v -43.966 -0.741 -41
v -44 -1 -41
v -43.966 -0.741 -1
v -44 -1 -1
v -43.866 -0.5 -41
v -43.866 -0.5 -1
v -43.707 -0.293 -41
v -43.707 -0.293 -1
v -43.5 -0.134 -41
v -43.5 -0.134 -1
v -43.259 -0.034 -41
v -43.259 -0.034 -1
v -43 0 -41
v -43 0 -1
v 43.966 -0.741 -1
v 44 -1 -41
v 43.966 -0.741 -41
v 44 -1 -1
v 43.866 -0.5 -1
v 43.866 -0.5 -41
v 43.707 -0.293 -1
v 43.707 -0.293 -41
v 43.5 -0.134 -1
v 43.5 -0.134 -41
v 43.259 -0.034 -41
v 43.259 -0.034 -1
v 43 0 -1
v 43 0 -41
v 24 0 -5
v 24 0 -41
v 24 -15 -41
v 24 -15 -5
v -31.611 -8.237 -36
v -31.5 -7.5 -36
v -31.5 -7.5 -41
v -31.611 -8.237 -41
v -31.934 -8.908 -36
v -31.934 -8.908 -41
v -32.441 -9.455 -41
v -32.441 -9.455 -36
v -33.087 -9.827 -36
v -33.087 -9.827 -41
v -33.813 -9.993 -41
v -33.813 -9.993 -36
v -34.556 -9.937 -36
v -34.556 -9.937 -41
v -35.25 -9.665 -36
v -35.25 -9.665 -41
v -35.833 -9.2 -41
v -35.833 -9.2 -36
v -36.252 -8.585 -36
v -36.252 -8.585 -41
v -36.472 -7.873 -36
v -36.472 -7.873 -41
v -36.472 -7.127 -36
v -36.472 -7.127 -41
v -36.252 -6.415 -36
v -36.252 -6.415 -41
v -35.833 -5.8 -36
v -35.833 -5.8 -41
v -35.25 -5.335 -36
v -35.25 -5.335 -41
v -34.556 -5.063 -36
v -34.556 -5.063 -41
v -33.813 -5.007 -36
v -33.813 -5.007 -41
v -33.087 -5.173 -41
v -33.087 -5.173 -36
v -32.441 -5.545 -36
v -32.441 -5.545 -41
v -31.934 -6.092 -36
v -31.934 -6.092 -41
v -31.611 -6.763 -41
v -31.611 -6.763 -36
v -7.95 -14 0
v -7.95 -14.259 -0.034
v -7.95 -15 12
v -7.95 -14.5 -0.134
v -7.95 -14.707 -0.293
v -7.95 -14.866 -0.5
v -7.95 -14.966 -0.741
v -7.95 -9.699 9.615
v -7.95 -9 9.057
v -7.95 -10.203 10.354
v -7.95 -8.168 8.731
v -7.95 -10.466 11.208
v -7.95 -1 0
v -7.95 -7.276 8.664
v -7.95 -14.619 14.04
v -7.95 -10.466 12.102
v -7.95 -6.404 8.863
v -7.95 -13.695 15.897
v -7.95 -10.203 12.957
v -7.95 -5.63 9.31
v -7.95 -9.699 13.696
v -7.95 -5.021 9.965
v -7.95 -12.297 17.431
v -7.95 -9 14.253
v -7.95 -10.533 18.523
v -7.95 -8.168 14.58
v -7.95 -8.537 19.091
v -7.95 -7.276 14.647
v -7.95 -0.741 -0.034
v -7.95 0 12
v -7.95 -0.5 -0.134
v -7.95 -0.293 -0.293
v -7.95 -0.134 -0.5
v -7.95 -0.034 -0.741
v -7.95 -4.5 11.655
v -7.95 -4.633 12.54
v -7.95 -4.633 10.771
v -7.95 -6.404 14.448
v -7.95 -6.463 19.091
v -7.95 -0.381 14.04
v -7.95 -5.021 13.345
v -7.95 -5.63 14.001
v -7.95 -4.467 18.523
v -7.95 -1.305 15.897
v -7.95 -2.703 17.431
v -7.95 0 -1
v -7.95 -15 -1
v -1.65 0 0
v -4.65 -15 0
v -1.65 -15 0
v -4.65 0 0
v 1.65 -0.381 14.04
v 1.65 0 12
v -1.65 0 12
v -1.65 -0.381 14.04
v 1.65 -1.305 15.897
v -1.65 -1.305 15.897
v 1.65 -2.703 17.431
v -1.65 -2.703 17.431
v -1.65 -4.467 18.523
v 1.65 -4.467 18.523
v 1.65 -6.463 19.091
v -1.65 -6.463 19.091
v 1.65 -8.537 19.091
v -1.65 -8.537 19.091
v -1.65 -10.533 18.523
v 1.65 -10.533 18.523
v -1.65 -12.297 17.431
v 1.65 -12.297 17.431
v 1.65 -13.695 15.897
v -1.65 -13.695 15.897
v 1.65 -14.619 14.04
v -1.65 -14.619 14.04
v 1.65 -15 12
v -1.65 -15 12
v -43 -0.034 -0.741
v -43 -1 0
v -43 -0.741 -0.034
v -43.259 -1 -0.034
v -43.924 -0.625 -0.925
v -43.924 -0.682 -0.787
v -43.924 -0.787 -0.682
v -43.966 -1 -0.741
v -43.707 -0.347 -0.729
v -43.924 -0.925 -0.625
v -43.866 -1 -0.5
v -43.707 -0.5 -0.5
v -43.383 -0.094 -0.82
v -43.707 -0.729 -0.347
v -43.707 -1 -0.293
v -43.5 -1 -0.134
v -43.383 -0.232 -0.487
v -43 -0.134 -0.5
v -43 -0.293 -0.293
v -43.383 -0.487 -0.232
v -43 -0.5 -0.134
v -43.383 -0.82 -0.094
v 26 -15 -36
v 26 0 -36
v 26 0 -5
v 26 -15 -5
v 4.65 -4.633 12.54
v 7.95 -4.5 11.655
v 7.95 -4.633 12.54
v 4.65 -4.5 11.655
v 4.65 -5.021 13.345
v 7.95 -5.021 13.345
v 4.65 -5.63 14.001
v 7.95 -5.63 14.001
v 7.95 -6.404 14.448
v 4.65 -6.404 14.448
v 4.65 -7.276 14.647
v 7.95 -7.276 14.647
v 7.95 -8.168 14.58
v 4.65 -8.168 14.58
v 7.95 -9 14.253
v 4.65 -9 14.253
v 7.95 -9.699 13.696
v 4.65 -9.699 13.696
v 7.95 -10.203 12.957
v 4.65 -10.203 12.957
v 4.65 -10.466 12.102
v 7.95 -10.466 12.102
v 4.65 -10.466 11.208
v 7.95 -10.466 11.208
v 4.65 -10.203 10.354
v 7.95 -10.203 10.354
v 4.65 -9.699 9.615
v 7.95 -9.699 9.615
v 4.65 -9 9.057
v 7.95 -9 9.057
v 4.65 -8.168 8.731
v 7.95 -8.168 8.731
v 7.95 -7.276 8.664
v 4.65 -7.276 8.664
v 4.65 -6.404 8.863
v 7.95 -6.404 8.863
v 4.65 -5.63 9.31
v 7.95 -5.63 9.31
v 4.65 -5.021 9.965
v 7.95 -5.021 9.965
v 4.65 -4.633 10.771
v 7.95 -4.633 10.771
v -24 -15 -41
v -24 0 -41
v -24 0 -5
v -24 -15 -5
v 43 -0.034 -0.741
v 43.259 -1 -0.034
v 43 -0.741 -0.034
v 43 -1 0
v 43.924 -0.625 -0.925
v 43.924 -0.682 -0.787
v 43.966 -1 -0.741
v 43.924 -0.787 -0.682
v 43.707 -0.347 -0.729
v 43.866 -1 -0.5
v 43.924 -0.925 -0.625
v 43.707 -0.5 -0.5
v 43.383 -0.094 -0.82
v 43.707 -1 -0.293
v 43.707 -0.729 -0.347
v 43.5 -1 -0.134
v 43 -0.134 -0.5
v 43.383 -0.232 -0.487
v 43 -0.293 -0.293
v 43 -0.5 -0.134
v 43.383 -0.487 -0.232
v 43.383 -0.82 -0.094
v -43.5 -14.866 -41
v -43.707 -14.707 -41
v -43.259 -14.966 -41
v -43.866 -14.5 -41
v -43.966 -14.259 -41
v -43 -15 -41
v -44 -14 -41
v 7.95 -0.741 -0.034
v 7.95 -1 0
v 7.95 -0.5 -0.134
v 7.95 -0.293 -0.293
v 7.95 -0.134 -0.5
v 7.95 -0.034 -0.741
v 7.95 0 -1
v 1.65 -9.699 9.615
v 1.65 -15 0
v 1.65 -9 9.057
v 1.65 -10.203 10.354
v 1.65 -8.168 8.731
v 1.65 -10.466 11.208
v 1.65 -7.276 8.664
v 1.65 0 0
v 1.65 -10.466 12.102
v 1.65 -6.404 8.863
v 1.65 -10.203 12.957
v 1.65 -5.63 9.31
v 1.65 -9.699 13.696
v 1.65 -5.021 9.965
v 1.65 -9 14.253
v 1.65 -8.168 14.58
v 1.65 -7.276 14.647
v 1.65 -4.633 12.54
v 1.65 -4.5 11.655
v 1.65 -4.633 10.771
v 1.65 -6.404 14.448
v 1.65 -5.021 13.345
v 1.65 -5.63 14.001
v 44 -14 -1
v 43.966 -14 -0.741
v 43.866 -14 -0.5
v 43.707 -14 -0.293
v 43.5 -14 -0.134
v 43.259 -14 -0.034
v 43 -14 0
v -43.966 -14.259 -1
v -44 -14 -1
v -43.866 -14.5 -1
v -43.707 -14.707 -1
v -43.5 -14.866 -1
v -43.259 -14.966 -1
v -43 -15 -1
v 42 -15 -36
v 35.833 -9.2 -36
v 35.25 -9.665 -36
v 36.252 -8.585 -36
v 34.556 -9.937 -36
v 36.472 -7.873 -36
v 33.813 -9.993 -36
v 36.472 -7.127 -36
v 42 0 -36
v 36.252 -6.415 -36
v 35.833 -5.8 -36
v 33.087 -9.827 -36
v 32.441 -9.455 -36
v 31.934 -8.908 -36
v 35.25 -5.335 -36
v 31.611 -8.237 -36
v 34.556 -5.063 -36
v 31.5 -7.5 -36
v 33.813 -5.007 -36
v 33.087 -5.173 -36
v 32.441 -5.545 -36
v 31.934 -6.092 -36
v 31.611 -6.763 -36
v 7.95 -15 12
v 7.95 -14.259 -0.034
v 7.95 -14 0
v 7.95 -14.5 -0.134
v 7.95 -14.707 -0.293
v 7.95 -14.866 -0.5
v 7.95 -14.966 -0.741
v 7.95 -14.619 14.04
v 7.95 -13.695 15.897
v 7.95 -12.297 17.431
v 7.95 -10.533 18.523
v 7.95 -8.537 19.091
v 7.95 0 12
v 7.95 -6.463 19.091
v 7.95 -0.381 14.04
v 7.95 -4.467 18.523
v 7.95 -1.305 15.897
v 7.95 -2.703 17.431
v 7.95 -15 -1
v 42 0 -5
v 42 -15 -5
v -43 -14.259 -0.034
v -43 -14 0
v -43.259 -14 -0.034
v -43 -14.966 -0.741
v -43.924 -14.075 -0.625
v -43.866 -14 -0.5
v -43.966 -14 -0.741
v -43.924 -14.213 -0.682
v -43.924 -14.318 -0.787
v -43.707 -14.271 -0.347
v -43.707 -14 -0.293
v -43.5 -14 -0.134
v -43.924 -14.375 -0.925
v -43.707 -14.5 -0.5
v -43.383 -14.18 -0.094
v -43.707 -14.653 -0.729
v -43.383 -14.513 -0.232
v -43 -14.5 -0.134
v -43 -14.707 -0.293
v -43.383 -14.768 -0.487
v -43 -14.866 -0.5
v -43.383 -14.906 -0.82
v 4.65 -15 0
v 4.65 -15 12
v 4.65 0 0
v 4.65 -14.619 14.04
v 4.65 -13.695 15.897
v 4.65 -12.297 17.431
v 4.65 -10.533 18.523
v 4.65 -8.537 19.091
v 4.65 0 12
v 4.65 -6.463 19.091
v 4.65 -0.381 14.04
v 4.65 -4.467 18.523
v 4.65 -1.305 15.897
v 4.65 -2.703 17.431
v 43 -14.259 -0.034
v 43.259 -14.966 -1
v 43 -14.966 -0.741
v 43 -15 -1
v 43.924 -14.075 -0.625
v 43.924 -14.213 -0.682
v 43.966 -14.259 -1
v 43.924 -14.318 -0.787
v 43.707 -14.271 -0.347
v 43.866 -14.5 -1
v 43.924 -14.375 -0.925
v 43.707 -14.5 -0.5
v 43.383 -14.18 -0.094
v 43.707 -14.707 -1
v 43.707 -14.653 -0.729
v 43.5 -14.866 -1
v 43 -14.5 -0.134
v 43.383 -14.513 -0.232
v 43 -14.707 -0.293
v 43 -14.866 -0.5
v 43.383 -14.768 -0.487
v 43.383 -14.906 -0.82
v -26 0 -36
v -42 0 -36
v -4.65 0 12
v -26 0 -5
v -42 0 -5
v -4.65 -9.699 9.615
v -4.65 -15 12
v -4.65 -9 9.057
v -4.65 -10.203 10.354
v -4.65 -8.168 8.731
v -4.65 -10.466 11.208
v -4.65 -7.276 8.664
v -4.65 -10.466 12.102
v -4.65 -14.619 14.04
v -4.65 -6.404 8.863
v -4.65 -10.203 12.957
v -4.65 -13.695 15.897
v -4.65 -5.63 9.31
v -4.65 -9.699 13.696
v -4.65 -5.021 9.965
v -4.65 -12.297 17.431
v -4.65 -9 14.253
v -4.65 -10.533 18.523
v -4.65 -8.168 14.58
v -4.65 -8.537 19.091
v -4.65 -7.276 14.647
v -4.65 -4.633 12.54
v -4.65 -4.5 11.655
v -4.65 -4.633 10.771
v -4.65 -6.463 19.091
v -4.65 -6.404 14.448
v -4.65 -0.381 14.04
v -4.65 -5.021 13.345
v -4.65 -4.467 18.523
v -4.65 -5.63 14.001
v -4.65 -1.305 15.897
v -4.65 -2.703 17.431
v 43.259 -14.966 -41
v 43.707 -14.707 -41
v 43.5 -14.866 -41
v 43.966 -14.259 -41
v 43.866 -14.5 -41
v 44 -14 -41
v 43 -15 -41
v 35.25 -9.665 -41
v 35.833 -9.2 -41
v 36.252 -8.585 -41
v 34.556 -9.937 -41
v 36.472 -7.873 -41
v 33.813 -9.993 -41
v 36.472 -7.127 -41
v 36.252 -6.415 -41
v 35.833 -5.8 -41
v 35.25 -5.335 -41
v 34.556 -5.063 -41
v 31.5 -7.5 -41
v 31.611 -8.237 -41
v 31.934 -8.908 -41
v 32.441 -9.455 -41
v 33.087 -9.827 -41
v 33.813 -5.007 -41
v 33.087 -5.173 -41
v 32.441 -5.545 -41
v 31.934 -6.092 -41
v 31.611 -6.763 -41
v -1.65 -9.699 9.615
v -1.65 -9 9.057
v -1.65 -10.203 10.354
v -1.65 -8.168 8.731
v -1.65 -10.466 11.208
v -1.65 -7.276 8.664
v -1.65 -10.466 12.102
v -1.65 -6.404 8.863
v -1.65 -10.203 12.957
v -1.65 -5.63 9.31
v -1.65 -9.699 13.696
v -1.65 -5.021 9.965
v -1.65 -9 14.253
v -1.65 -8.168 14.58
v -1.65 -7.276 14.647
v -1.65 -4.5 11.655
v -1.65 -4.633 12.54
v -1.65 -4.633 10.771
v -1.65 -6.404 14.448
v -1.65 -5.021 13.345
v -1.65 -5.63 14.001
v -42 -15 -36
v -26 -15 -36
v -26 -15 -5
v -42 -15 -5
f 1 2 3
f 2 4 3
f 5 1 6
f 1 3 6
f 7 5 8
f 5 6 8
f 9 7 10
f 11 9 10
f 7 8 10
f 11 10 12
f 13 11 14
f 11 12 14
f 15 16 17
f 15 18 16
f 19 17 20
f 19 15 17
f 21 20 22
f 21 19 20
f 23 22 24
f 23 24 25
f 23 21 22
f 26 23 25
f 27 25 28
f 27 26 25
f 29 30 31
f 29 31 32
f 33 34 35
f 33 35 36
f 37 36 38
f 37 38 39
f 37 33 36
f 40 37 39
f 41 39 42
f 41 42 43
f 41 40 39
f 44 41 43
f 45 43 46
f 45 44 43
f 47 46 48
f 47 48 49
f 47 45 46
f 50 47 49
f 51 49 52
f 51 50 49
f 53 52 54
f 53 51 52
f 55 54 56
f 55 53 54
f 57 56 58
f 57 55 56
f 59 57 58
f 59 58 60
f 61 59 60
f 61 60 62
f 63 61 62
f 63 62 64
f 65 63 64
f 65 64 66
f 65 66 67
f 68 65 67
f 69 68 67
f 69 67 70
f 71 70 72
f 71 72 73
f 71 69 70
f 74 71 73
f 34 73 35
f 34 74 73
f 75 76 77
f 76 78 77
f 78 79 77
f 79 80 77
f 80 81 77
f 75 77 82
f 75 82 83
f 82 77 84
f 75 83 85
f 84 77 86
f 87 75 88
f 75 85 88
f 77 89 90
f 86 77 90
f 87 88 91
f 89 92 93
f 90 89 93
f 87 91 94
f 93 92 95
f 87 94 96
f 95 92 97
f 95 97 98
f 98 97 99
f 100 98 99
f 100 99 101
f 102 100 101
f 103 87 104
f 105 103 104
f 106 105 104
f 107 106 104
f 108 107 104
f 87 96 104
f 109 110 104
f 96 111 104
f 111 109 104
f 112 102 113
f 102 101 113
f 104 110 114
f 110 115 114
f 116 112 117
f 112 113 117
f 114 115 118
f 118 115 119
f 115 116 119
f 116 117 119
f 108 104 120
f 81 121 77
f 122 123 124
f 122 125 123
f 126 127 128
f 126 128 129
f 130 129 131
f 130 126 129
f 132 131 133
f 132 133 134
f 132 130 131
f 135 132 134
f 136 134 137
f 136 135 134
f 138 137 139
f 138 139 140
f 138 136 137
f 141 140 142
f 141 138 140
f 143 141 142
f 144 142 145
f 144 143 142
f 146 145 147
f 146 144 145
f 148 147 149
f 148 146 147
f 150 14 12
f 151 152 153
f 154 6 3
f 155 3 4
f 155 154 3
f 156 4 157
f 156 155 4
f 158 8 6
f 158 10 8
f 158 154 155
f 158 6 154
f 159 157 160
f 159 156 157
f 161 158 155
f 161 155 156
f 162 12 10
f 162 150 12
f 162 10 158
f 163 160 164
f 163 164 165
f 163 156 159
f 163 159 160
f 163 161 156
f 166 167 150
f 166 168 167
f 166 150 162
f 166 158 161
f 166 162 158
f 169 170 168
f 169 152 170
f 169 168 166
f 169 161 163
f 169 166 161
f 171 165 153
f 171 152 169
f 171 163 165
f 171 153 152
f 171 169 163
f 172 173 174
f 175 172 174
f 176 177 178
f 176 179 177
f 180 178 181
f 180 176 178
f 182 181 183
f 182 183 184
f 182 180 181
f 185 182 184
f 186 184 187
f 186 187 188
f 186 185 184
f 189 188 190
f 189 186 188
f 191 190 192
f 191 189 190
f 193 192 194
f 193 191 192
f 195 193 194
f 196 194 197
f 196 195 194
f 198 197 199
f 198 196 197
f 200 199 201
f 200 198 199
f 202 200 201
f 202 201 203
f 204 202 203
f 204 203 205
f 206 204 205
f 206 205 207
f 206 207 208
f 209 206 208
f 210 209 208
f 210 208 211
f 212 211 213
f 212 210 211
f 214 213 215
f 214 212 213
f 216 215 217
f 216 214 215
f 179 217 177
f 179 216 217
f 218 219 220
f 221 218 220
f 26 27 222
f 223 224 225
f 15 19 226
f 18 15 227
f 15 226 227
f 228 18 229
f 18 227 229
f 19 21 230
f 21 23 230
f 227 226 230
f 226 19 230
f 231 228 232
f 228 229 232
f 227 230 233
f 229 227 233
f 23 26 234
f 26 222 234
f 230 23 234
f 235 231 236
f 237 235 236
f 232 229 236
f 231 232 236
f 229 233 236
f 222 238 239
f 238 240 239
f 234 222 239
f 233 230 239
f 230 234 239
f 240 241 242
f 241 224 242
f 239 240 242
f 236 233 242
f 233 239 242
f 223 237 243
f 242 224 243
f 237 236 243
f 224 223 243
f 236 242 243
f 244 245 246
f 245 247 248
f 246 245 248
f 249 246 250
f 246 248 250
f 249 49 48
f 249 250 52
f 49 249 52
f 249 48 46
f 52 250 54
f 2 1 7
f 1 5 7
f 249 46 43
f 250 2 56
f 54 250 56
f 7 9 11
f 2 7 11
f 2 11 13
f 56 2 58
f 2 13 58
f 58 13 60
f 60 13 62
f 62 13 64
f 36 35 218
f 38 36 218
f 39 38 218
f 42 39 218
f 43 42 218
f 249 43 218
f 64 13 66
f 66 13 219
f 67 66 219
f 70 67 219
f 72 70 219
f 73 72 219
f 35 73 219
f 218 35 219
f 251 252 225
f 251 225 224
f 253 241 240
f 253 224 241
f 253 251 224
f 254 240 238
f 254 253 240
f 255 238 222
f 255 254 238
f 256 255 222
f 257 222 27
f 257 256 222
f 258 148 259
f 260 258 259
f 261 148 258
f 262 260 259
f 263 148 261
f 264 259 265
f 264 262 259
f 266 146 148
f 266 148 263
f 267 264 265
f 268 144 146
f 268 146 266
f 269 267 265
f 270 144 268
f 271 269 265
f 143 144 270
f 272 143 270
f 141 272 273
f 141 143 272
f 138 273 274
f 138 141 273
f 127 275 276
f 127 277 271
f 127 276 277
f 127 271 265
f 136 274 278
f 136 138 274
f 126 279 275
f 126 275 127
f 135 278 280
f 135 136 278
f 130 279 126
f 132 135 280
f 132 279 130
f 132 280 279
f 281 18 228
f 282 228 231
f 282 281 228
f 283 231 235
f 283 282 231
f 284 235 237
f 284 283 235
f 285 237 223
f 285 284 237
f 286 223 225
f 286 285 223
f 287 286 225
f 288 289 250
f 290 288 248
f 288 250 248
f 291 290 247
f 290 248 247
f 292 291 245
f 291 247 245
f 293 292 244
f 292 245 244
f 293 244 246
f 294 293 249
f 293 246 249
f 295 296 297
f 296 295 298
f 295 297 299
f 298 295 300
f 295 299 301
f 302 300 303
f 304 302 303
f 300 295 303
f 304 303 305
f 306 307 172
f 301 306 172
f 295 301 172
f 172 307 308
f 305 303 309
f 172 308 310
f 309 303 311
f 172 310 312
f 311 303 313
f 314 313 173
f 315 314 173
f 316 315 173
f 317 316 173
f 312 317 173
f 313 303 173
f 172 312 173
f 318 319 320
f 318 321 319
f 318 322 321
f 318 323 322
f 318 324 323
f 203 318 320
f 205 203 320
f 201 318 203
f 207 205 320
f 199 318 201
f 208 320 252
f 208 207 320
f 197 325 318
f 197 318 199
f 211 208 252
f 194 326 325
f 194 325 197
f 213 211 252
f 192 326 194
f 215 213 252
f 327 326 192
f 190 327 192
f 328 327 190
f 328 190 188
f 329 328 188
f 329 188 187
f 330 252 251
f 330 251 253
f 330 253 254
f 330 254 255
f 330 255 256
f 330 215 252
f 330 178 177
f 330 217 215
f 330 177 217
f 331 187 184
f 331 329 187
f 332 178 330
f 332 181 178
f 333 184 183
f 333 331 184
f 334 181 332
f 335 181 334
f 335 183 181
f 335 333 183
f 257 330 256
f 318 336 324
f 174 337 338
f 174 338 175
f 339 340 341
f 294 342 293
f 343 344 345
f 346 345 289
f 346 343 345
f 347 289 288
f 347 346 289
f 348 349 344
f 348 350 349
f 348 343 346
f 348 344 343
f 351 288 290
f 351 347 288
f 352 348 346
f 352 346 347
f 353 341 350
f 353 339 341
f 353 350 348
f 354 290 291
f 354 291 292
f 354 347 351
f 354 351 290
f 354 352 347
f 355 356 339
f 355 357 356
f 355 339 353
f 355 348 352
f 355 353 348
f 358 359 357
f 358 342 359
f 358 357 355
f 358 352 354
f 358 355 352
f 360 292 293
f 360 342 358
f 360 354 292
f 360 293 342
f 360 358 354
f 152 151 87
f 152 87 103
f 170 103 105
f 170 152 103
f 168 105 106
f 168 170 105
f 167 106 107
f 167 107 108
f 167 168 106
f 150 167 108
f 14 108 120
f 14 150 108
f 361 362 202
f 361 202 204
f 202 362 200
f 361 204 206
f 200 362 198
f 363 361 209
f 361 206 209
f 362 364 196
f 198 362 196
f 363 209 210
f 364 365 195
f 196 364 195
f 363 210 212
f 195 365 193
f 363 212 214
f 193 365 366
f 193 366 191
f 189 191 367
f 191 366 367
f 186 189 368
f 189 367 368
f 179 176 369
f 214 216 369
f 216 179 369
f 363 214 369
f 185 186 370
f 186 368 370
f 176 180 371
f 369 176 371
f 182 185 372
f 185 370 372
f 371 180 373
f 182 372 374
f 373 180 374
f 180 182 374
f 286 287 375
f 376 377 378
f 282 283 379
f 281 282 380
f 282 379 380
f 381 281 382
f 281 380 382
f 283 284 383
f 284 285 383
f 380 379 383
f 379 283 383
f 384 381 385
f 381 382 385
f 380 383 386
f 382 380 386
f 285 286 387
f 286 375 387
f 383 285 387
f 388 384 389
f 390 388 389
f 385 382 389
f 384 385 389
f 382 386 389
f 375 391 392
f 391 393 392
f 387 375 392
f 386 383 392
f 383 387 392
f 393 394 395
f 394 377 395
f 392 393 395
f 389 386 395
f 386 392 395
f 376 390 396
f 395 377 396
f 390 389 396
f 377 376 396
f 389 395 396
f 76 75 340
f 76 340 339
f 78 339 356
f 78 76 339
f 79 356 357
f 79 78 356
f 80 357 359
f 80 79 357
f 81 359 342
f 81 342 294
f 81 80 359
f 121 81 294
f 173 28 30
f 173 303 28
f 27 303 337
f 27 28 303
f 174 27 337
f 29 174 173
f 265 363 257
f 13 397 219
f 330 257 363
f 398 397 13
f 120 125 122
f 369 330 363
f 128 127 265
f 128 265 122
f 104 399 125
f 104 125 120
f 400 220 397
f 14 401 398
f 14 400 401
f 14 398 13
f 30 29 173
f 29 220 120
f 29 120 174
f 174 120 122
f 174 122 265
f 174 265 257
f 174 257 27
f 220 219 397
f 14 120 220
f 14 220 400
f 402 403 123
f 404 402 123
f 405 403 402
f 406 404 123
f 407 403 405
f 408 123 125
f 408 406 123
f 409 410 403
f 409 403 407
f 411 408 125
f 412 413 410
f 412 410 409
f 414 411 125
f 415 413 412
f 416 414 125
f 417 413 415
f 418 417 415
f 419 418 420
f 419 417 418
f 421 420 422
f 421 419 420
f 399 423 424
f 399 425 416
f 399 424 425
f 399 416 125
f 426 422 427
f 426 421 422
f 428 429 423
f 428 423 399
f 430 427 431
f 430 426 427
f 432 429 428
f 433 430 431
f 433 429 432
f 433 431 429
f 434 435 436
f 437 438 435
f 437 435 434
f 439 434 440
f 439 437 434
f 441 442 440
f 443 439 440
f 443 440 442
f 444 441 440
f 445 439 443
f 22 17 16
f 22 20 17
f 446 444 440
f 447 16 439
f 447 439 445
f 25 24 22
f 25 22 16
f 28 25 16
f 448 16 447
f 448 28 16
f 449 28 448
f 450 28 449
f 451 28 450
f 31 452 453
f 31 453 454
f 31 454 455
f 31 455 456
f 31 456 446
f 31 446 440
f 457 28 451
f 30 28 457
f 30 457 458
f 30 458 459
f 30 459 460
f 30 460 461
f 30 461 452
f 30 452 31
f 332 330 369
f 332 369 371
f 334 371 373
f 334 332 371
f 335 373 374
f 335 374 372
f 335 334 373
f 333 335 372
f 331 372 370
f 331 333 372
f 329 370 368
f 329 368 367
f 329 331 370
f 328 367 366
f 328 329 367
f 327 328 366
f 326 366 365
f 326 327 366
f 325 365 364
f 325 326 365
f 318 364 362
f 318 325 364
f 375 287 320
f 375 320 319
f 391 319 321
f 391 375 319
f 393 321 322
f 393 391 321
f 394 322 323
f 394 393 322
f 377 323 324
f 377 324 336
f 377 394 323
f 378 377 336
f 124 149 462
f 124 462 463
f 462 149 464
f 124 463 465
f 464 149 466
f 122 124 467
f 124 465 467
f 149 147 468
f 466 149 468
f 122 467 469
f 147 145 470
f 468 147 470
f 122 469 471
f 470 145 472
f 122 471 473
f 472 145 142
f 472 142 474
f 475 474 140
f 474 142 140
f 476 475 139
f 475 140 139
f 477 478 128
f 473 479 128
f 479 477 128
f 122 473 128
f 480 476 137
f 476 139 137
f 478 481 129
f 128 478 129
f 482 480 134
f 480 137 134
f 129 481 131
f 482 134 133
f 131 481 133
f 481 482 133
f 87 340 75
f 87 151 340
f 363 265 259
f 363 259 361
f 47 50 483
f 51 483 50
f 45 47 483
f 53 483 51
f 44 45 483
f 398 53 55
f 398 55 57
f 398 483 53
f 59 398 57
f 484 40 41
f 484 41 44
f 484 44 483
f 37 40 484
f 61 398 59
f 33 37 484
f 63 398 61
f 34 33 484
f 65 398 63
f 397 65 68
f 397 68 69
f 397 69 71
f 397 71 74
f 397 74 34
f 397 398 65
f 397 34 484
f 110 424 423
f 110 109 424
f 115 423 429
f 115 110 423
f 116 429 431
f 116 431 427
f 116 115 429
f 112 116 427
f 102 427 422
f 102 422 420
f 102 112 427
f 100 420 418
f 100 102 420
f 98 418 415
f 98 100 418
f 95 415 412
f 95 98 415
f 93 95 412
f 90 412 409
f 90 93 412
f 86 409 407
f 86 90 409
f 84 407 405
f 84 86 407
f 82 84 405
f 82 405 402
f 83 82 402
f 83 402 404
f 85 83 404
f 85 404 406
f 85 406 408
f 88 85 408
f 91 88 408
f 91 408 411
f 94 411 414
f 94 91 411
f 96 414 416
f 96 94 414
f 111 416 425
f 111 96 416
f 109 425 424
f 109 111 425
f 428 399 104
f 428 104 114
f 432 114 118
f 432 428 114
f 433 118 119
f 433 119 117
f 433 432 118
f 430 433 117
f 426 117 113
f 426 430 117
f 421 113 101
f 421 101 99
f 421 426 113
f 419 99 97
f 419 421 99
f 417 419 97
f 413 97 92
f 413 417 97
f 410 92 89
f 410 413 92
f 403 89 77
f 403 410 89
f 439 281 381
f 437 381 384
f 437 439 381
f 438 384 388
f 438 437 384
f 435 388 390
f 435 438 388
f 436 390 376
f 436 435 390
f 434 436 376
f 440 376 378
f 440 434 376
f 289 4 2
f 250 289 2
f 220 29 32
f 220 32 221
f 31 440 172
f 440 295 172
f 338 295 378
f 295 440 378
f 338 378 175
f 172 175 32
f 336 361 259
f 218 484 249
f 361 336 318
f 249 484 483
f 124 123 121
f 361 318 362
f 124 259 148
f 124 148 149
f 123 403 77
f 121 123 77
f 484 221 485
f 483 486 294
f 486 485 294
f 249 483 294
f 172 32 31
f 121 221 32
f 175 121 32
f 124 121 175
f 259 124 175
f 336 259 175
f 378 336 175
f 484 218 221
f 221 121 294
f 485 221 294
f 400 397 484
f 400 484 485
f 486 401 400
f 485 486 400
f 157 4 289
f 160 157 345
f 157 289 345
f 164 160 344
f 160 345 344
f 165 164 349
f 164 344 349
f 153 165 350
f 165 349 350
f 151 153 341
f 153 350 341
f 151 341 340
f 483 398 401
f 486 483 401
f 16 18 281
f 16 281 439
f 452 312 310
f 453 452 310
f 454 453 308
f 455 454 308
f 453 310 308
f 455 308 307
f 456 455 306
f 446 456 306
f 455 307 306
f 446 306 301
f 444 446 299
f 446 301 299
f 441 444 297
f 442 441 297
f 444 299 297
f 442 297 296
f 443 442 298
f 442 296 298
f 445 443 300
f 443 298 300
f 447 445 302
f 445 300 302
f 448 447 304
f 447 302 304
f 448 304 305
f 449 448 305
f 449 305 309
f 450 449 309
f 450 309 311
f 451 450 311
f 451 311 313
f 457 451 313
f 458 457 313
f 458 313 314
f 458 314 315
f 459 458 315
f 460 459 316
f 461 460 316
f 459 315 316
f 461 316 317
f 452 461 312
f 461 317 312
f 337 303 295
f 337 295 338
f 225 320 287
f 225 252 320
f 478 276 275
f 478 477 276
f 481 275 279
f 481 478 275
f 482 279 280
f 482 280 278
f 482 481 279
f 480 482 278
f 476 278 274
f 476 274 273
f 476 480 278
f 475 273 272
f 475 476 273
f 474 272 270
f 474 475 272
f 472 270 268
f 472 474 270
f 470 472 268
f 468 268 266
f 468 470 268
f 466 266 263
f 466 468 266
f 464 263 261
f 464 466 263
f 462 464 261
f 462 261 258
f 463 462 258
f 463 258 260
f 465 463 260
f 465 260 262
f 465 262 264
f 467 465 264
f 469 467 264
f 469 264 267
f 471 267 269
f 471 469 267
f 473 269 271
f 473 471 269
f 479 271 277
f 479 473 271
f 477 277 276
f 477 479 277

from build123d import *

# Parameters (mm, degrees)
SKETCH_W               = 16
SKETCH_H               = 31
PAD_DEPTH              = 15
SKETCH001_R            = 2.5
POCKET_DEPTH           = 5
SKETCH002_R            = 3
PAD001_DEPTH           = 1.65
LINEARPATTERN_COUNT    = 2
LINEARPATTERN_PITCH    = 6.3
LINEARPATTERN001_COUNT = 2
LINEARPATTERN001_PITCH = 6.3
FILLET_R               = 1
FILLET001_R            = 1
FILLET002_R            = 1
FILLET003_R            = 1
FILLET004_R            = 1
FILLET005_R            = 1


with BuildPart() as part:
    # Sketch → Pad (new body)
    with BuildSketch(Plane.XZ):
        Polygon((0, 0), (-44, 0), (-44, -41), (-24, -41), (-24, -5), (0, -5), align=None)
        with Locations((-34, -20.5)):
            Rectangle(SKETCH_W, SKETCH_H, mode=Mode.SUBTRACT)
    pad = extrude(amount=PAD_DEPTH)

    # Mirrored: Pad across Sketch V_Axis
    add(pad.mirror(Plane(origin=(0, 0, 0), x_dir=(0, -1, 0), z_dir=(1, 0, 0))))

    # Sketch001 (on Face11 of Mirrored) → Pocket (cut)
    with BuildSketch(Plane(origin=(0, 0, -36), x_dir=(-1, 0, 0), z_dir=(0, 0, 1))):
        with Locations((-34, 7.5)):
            Circle(SKETCH001_R)
    pocket = extrude(amount=-POCKET_DEPTH, mode=Mode.SUBTRACT)

    # Mirrored001: Pocket across Sketch001 V_Axis
    add(pocket.mirror(Plane(origin=(0, 0, -36), x_dir=(0, 0, 1), z_dir=(-1, 0, 0))), mode=Mode.SUBTRACT)

    # Sketch002 → Pad001 (join, symmetric)
    with BuildSketch(Plane.YZ):
        with BuildLine():
            Line((-15, 0), (0, 0))
            Line((0, 0), (0, 12))
            ThreePointArc((0, 12), (-7.5, 19.163278), (-15, 12))
            Line((-15, 12), (-15, 0))
        make_face()
        with Locations((-7.5, 11.655364)):
            Circle(SKETCH002_R, mode=Mode.SUBTRACT)
    pad001 = extrude(amount=PAD001_DEPTH, both=True)

    # LinearPattern: Pad001 ×2
    with Locations(*[(i * LINEARPATTERN_PITCH, 0, 0) for i in range(1, LINEARPATTERN_COUNT)]):
        add(pad001)

    # LinearPattern001: Pad001 ×2
    with Locations(*[(-i * LINEARPATTERN001_PITCH, 0, 0) for i in range(1, LINEARPATTERN001_COUNT)]):
        add(pad001)

    # Fillet
    fillet_edges = [part.edges().sort_by_distance(p)[0] for p in [
        (25.975, 0, 0),
    ]]
    fillet(fillet_edges, radius=FILLET_R)

    # Fillet001
    fillet001_edges = [part.edges().sort_by_distance(p)[0] for p in [
        (-25.975, 0, 0),
    ]]
    fillet(fillet001_edges, radius=FILLET001_R)

    # Fillet002
    fillet002_edges = [part.edges().sort_by_distance(p)[0] for p in [
        (25.975, -15, 0),
    ]]
    fillet(fillet002_edges, radius=FILLET002_R)

    # Fillet003
    fillet003_edges = [part.edges().sort_by_distance(p)[0] for p in [
        (-25.975, -15, 0),
    ]]
    fillet(fillet003_edges, radius=FILLET003_R)

    # Fillet004
    fillet004_edges = [part.edges().sort_by_distance(p)[0] for p in [
        (-44, -7.5, 0),
    ]]
    fillet(fillet004_edges, radius=FILLET004_R)

    # Fillet005
    fillet005_edges = [part.edges().sort_by_distance(p)[0] for p in [
        (44, -7.5, 0),
    ]]
    fillet(fillet005_edges, radius=FILLET005_R)


solid = part.part
